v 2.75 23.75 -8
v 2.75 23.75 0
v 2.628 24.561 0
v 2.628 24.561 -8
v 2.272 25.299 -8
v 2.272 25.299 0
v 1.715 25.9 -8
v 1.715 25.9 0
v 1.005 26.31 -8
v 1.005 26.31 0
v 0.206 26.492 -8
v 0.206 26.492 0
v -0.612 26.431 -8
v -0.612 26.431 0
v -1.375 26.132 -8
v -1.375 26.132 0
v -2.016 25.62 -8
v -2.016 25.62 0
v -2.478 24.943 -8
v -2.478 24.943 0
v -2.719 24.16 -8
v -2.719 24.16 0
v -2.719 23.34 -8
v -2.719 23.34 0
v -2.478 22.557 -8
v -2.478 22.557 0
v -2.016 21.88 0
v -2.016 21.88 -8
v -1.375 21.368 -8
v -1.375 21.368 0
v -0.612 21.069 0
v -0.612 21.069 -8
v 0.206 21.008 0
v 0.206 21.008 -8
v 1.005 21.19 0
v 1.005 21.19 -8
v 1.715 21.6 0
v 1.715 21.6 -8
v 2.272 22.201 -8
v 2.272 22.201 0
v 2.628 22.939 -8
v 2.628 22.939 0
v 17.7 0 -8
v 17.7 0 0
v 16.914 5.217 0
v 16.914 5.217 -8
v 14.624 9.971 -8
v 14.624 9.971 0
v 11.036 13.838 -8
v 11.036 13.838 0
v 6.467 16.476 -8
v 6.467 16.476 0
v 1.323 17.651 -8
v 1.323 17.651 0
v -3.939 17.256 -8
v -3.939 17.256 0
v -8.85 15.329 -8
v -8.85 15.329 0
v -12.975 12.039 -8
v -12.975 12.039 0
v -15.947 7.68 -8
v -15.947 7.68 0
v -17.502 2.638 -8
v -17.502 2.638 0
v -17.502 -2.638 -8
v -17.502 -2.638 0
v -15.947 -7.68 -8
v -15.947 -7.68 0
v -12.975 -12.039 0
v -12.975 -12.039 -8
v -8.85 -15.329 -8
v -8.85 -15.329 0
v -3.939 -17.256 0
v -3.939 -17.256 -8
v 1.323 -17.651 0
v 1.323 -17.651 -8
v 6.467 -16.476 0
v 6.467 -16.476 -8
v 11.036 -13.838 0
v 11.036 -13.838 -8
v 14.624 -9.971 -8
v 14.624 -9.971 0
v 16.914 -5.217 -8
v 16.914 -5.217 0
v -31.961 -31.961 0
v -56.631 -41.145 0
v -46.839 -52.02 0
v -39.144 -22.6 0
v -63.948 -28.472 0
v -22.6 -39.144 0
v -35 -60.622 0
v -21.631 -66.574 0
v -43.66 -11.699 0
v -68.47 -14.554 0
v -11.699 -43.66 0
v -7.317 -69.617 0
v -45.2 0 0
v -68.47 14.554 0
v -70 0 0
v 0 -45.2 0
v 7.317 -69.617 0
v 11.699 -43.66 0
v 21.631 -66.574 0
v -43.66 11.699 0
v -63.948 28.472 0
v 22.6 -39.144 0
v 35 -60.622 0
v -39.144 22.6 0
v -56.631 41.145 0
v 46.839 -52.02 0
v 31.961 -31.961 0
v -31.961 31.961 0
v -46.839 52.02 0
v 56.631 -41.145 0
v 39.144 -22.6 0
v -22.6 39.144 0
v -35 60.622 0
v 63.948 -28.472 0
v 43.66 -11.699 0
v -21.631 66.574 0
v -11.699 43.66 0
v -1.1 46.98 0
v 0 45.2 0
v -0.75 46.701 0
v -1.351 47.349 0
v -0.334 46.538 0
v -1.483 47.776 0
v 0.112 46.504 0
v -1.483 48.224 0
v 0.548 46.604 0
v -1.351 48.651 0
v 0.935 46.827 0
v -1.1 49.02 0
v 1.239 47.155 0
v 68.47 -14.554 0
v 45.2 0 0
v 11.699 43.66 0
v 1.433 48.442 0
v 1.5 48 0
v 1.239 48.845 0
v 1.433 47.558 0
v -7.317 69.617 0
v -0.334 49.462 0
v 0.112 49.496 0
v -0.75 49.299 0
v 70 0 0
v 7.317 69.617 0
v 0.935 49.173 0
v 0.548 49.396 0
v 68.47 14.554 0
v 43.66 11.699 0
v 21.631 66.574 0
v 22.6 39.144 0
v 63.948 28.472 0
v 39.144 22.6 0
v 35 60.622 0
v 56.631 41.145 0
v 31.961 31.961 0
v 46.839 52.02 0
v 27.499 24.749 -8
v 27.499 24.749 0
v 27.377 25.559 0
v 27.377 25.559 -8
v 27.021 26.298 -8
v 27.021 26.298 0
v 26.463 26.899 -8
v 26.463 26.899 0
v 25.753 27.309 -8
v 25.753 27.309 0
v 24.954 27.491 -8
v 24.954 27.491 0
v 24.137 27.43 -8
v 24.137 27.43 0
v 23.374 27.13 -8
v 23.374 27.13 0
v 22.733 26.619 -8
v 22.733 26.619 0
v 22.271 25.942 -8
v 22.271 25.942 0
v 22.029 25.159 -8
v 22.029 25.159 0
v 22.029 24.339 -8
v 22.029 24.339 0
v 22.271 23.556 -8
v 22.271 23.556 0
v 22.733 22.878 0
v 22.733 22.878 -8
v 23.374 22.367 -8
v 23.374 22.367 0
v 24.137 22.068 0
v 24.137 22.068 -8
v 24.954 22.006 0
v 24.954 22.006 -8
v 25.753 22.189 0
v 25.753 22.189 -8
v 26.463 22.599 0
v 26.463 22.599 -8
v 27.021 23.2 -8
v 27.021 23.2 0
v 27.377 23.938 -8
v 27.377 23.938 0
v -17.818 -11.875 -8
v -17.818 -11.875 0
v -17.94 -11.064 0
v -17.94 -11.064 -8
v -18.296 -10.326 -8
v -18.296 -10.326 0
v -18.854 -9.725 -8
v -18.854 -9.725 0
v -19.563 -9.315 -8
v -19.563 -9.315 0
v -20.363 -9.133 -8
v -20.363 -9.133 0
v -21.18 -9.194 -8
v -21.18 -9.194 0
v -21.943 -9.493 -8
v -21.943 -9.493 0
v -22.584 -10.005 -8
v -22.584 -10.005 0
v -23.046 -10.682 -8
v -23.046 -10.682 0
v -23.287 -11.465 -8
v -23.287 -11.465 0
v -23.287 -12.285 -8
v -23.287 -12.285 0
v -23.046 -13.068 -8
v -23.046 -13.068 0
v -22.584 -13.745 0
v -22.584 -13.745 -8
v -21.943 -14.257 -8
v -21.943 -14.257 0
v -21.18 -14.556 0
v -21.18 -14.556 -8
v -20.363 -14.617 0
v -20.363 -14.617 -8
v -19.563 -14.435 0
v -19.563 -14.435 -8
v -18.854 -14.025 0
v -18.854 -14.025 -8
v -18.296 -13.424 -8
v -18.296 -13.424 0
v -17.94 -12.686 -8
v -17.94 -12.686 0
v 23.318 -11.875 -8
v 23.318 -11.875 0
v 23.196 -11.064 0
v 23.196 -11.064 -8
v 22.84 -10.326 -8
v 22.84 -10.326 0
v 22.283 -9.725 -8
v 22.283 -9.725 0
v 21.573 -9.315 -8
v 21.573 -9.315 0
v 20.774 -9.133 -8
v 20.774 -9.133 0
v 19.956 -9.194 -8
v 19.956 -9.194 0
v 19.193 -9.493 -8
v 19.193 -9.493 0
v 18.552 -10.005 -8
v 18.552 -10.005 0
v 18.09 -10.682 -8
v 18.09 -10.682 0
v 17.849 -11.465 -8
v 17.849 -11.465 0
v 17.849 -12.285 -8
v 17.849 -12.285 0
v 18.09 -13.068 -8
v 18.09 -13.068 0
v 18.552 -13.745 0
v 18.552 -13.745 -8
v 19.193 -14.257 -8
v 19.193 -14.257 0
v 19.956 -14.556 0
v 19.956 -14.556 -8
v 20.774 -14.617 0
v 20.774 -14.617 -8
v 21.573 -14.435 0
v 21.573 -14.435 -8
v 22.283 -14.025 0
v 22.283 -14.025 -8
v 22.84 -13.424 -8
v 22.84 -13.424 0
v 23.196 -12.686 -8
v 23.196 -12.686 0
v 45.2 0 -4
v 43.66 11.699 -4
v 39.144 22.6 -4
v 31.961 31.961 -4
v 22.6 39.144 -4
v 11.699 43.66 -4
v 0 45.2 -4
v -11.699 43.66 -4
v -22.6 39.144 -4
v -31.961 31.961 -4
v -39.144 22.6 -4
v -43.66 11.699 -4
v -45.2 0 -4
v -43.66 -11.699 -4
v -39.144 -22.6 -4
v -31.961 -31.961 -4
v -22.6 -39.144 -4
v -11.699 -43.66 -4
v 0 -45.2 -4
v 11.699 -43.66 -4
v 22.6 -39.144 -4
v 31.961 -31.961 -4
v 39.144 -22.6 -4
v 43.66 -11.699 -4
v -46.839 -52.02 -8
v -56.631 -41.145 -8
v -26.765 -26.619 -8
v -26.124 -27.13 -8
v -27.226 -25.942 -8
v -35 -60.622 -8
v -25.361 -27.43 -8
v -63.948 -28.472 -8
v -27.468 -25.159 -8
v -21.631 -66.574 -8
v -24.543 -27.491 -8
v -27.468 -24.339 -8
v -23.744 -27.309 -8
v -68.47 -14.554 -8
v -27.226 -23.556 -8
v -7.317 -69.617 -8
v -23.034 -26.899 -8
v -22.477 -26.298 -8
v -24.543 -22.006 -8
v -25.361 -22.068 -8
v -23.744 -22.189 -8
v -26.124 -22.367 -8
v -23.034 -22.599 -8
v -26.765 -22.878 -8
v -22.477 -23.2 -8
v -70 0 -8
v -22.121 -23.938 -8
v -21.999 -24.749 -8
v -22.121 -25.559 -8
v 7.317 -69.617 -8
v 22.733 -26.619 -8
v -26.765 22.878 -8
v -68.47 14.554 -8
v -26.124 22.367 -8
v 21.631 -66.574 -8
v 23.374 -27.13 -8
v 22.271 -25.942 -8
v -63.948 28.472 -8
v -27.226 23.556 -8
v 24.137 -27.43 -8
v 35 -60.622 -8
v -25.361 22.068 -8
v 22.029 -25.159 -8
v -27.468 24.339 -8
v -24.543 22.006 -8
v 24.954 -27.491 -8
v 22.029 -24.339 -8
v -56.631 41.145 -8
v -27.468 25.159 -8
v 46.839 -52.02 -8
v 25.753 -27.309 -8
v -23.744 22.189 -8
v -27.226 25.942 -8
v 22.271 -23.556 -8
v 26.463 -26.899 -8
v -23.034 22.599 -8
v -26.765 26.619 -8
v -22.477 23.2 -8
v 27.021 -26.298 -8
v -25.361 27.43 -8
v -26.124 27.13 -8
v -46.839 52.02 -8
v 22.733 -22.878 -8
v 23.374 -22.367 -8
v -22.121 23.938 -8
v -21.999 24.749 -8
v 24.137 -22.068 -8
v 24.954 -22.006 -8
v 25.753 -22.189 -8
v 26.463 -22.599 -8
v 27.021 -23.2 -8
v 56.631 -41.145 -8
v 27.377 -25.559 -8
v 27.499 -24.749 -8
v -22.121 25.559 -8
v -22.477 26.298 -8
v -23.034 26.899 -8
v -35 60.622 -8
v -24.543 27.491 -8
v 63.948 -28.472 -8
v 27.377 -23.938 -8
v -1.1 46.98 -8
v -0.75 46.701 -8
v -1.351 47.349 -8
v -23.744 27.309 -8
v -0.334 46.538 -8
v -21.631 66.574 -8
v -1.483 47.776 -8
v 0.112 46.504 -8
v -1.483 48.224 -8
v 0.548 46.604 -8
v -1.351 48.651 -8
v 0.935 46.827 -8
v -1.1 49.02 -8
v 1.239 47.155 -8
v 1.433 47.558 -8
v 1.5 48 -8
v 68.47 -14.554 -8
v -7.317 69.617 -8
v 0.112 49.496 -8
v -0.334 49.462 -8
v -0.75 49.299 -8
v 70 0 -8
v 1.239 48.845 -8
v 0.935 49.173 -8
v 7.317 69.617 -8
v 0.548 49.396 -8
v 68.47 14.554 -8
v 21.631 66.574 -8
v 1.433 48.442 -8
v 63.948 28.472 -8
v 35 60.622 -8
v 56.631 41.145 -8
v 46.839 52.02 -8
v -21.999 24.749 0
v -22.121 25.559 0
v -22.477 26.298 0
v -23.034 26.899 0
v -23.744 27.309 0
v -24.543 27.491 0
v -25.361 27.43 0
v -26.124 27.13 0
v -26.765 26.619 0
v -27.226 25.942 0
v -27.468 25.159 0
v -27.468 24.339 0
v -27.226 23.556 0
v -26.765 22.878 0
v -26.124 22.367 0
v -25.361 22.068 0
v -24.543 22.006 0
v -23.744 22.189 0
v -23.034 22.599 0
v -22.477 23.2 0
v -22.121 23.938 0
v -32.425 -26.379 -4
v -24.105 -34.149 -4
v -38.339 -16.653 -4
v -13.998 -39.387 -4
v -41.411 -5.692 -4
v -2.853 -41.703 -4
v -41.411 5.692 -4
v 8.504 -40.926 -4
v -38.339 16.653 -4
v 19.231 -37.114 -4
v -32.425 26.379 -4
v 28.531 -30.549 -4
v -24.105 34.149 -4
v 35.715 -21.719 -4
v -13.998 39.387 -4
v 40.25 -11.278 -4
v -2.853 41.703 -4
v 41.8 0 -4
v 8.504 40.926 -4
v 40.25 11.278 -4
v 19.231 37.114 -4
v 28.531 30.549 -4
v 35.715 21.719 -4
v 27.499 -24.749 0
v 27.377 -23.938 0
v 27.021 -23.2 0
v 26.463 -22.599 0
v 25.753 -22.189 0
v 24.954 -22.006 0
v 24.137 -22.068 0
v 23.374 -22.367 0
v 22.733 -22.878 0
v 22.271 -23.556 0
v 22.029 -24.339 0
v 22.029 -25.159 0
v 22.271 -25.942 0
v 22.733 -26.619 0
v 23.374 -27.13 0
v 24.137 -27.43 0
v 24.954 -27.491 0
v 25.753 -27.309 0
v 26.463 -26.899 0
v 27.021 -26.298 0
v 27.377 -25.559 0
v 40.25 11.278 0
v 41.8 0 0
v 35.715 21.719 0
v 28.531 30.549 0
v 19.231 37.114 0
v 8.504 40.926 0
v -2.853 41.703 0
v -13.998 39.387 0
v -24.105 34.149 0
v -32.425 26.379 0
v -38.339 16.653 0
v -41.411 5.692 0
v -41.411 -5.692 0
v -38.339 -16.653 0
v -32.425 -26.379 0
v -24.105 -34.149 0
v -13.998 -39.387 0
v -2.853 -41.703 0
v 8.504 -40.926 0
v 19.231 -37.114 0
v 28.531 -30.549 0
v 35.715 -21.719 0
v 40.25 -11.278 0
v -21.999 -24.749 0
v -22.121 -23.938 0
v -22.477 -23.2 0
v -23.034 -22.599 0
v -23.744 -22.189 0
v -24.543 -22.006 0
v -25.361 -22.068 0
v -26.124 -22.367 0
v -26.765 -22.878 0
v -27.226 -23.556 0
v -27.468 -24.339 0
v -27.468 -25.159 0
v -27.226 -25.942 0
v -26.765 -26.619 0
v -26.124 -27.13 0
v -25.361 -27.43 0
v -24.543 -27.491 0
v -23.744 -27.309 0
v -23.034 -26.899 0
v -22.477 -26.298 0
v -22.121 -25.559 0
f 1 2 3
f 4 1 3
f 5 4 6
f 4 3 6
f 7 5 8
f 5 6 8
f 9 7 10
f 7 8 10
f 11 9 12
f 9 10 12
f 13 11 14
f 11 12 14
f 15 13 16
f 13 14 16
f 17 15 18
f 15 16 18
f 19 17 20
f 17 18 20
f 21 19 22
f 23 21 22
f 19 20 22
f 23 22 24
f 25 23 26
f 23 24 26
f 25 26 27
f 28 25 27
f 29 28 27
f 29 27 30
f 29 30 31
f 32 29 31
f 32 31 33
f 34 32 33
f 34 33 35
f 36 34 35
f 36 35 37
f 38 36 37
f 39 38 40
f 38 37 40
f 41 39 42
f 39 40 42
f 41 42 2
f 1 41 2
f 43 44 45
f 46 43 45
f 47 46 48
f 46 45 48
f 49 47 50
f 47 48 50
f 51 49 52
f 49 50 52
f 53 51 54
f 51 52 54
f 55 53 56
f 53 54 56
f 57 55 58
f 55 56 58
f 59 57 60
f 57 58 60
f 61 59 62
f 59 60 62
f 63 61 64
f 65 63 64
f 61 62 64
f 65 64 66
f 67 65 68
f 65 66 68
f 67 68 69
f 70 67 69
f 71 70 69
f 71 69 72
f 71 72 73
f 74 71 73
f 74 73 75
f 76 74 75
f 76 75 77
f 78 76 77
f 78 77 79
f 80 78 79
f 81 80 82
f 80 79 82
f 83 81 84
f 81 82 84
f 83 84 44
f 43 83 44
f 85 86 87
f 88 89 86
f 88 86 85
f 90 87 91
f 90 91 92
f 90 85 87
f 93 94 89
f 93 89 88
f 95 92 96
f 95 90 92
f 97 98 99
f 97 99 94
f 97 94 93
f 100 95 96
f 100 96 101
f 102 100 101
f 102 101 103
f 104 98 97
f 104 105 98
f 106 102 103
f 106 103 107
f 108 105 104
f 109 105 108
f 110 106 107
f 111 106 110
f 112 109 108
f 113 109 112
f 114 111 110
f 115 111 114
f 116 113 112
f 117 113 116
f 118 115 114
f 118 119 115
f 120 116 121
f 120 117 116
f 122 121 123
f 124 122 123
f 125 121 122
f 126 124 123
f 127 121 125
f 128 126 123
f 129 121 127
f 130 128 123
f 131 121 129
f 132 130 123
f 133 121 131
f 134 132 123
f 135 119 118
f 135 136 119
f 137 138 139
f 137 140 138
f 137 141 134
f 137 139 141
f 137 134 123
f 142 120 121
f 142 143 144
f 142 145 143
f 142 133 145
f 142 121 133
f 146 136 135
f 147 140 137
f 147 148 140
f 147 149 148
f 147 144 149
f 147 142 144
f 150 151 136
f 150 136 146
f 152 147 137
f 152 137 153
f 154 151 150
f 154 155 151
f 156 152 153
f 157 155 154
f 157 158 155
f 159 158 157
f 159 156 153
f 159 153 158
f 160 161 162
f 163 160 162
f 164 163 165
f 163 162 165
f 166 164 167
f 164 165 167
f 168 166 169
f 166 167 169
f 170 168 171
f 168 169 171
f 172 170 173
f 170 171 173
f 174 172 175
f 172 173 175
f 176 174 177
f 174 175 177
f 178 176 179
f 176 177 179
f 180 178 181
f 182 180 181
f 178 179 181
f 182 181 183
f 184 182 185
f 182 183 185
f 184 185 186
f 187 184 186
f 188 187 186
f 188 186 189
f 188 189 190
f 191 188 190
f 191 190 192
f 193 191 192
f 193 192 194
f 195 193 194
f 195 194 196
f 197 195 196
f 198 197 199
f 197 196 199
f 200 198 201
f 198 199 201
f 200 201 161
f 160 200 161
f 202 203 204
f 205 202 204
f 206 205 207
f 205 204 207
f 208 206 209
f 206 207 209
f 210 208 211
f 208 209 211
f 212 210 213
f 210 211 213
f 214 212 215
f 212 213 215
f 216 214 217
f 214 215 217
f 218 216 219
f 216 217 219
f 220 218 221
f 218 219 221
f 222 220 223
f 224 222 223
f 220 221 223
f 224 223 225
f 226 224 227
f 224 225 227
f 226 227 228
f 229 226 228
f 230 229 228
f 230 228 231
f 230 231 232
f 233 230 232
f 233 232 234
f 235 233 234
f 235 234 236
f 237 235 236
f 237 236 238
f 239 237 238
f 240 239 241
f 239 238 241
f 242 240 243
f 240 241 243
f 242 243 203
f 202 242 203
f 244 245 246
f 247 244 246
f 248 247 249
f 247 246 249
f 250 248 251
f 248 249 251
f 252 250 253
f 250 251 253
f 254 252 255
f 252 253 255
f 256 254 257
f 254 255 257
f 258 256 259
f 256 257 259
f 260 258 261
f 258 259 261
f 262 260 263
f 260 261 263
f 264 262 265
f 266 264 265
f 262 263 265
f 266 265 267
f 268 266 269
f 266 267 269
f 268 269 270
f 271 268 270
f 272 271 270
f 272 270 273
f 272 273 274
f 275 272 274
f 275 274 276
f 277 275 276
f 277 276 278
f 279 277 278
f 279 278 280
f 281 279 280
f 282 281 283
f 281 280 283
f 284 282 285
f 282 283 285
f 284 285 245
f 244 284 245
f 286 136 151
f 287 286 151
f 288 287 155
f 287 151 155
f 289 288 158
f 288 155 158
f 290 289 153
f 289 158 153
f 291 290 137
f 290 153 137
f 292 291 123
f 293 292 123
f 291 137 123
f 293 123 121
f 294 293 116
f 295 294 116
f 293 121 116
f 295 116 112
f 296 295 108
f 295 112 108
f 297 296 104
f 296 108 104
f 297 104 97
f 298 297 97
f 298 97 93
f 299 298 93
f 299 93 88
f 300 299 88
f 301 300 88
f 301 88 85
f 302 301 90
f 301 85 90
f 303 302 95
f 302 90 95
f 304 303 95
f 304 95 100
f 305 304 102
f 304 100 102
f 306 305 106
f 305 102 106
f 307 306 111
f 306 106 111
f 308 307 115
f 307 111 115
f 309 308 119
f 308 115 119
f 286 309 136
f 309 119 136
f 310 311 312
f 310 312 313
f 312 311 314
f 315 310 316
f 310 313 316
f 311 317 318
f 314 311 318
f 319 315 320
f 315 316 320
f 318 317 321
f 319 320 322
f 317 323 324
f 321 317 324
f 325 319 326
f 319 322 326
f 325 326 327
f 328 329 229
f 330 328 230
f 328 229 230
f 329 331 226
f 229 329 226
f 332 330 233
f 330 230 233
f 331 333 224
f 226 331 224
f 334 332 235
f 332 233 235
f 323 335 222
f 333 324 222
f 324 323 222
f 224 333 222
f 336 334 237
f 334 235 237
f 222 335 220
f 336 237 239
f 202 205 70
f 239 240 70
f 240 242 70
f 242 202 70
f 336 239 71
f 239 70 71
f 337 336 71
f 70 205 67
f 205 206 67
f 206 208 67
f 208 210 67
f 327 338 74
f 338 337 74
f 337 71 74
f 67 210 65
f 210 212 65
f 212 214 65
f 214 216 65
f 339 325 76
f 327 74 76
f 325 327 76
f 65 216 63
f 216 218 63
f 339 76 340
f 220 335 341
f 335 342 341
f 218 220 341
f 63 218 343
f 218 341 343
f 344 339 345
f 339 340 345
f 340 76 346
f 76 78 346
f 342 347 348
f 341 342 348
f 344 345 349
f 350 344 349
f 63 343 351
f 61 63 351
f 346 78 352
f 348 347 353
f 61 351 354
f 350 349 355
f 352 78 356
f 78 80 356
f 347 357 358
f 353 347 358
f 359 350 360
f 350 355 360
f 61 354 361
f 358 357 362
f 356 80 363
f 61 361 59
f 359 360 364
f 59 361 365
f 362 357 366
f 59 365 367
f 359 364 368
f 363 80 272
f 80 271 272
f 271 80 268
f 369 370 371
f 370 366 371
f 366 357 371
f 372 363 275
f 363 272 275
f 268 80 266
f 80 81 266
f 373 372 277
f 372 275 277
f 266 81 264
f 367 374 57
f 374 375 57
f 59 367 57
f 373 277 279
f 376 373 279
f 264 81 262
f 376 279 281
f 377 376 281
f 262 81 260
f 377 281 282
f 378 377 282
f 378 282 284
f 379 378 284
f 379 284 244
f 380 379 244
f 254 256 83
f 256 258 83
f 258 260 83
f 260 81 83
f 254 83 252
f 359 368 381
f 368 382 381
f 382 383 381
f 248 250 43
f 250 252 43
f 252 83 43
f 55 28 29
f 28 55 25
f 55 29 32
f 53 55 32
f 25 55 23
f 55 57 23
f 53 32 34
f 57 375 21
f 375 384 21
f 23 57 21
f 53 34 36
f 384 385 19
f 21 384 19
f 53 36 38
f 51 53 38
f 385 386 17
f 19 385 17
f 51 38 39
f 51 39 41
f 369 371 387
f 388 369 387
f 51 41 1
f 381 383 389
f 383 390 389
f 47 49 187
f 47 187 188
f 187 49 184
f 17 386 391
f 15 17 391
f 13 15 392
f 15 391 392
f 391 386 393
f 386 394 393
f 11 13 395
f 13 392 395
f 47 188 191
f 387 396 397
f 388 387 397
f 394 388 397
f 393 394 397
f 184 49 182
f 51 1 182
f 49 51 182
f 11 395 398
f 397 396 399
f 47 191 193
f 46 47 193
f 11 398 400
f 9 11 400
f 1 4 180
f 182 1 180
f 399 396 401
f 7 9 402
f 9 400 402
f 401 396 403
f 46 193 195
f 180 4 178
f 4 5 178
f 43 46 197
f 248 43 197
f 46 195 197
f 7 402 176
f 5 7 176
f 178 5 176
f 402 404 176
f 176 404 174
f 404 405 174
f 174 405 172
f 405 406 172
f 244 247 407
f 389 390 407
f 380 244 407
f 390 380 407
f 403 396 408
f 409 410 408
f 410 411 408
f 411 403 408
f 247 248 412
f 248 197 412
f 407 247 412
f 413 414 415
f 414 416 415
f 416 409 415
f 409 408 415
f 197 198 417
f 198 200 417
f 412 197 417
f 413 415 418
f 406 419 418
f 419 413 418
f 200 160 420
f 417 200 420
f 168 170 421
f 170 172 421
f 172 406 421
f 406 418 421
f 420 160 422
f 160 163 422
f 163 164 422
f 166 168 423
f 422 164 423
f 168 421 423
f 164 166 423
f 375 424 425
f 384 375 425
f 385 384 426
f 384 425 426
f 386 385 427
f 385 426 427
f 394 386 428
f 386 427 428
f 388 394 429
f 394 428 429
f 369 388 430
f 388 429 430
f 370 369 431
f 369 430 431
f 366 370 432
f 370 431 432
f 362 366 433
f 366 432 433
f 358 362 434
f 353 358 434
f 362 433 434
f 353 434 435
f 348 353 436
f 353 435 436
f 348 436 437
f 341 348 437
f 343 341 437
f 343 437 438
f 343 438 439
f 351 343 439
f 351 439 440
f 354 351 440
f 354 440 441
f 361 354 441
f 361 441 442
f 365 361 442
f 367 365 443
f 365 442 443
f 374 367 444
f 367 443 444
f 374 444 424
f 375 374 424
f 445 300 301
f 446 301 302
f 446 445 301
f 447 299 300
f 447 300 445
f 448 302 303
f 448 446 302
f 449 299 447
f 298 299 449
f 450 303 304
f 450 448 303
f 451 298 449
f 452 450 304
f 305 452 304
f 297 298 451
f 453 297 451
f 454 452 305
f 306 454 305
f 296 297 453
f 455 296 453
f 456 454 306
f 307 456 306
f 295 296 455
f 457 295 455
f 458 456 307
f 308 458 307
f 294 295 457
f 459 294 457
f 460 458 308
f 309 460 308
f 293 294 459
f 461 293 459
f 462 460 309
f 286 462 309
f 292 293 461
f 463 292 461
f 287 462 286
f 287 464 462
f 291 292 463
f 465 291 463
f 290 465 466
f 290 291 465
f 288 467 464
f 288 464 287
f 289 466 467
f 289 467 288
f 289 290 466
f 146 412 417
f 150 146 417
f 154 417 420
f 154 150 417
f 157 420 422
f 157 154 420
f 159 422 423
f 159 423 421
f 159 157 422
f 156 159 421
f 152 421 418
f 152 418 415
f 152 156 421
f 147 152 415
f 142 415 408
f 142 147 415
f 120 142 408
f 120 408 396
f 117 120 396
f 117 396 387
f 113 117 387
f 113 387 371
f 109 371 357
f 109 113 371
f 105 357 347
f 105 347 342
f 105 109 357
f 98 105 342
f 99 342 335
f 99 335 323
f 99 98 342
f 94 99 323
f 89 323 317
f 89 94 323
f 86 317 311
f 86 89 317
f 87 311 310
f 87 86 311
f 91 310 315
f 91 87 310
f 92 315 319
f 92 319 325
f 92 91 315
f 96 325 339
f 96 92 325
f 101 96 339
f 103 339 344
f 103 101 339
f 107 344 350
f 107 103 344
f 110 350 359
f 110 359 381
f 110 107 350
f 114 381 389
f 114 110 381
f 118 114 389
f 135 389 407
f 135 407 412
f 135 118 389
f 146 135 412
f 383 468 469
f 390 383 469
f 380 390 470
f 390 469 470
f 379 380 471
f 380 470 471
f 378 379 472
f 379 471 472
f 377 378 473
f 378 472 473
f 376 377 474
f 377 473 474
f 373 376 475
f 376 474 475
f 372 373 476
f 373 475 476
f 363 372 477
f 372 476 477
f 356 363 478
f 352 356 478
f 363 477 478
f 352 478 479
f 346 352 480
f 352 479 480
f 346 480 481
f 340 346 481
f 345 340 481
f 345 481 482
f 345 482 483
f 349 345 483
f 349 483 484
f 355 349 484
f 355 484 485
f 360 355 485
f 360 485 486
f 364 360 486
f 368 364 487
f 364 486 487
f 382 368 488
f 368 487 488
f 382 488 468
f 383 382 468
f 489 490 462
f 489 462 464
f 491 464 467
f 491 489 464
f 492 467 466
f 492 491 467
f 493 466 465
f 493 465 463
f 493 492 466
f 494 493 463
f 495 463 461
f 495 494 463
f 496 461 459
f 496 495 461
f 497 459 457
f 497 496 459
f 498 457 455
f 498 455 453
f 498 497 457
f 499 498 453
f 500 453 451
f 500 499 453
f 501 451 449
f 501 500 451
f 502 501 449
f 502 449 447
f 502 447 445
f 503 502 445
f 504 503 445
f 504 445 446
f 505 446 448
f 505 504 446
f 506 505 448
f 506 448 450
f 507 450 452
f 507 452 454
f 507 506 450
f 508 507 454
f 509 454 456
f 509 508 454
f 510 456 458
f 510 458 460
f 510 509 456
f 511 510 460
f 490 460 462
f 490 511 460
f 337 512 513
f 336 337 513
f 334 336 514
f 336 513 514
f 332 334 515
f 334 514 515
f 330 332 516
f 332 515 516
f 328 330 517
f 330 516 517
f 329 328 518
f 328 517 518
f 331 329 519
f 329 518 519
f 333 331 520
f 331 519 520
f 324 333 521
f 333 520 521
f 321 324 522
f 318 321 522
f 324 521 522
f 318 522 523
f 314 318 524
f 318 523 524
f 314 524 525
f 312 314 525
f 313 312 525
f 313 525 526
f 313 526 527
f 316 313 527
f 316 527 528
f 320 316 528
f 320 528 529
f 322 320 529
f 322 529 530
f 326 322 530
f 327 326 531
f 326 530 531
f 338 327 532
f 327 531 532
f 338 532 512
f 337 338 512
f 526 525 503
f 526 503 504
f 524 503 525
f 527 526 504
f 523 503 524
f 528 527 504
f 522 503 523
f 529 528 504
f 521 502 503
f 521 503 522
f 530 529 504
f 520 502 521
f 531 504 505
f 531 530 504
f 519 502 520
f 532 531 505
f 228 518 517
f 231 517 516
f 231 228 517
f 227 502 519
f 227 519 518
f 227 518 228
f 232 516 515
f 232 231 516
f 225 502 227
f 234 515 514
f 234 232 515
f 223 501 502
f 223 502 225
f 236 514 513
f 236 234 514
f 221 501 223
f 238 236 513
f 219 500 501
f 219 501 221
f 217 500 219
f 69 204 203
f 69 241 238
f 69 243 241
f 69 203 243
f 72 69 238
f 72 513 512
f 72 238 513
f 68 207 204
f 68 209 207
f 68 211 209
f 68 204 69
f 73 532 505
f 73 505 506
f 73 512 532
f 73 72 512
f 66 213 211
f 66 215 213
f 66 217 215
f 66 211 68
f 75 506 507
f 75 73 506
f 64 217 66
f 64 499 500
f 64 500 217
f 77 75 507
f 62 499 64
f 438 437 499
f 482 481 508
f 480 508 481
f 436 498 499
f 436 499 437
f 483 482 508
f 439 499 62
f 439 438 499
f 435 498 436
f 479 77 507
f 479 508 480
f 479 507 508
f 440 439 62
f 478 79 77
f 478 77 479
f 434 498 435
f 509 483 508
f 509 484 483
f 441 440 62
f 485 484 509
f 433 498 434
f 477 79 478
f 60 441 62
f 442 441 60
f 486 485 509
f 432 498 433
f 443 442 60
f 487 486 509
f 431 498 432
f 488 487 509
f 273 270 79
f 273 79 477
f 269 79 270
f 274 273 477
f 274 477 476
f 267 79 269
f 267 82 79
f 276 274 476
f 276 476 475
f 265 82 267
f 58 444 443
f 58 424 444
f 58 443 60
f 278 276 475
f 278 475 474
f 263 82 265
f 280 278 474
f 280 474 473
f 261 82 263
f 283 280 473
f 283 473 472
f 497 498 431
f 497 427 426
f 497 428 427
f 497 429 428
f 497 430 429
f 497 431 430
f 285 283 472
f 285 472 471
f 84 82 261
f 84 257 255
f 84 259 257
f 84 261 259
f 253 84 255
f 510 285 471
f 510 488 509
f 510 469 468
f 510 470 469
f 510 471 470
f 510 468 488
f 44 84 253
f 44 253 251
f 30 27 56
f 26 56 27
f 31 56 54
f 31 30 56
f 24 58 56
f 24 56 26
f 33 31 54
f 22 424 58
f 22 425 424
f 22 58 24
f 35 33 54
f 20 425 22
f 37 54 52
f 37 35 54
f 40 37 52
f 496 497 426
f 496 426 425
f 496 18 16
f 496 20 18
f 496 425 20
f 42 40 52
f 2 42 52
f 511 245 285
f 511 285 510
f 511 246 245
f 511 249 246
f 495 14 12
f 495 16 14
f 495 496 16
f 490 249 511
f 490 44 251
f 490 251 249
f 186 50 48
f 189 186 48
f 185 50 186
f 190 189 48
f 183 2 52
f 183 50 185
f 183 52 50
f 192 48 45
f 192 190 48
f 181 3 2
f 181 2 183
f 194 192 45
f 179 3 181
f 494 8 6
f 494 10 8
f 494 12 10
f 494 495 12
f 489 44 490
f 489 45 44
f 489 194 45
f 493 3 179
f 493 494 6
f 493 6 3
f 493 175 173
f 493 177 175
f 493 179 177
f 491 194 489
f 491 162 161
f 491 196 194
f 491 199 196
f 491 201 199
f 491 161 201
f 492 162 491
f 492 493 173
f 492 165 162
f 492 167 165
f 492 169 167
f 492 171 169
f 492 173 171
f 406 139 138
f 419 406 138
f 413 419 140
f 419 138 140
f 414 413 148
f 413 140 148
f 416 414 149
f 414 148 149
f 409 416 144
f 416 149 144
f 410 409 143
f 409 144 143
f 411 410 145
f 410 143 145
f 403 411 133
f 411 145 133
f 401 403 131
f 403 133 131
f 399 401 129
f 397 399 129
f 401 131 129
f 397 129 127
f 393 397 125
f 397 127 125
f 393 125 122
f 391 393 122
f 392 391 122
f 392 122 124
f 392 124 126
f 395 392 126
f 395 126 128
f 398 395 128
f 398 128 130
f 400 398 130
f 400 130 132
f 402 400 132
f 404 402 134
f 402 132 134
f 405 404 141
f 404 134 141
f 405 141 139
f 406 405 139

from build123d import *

# Parameters (mm, degrees)
SKETCH_1_R          = 70
SKETCH_1_R_2        = 17.7
SKETCH_1_R_3        = 2.75
SKETCH_1_R_4        = 1.5
EXTRUDE_1_DEPTH     = 8
SKETCH_2_R          = 45.2
SKETCH_2_R_2        = 41.8
CUT_EXTRUDE_2_DEPTH = 4


with BuildPart() as part:
    # 草图1 → 凸台-拉伸1 (new body)
    with BuildSketch(Plane.XY):
        Circle(SKETCH_1_R)
        Circle(SKETCH_1_R_2, mode=Mode.SUBTRACT)
        with Locations((24.748737342, 24.748737342)):
            Circle(SKETCH_1_R_3, mode=Mode.SUBTRACT)
        with Locations((-24.748737342, 24.748737342)):
            Circle(SKETCH_1_R_3, mode=Mode.SUBTRACT)
        with Locations((-24.748737342, -24.748737342)):
            Circle(SKETCH_1_R_3, mode=Mode.SUBTRACT)
        with Locations((24.748737342, -24.748737342)):
            Circle(SKETCH_1_R_3, mode=Mode.SUBTRACT)
        with Locations((0, 23.75)):
            Circle(SKETCH_1_R_3, mode=Mode.SUBTRACT)
        with Locations((-20.56810334, -11.875)):
            Circle(SKETCH_1_R_3, mode=Mode.SUBTRACT)
        with Locations((20.56810334, -11.875)):
            Circle(SKETCH_1_R_3, mode=Mode.SUBTRACT)
        with Locations((0, 48)):
            Circle(SKETCH_1_R_4, mode=Mode.SUBTRACT)
    extrude(amount=-EXTRUDE_1_DEPTH)

    # 草图2 → 切除-拉伸2 (cut)
    with BuildSketch(Plane.XY):
        Circle(SKETCH_2_R)
        Circle(SKETCH_2_R_2, mode=Mode.SUBTRACT)
    extrude(amount=-CUT_EXTRUDE_2_DEPTH, mode=Mode.SUBTRACT)


solid = part.part
